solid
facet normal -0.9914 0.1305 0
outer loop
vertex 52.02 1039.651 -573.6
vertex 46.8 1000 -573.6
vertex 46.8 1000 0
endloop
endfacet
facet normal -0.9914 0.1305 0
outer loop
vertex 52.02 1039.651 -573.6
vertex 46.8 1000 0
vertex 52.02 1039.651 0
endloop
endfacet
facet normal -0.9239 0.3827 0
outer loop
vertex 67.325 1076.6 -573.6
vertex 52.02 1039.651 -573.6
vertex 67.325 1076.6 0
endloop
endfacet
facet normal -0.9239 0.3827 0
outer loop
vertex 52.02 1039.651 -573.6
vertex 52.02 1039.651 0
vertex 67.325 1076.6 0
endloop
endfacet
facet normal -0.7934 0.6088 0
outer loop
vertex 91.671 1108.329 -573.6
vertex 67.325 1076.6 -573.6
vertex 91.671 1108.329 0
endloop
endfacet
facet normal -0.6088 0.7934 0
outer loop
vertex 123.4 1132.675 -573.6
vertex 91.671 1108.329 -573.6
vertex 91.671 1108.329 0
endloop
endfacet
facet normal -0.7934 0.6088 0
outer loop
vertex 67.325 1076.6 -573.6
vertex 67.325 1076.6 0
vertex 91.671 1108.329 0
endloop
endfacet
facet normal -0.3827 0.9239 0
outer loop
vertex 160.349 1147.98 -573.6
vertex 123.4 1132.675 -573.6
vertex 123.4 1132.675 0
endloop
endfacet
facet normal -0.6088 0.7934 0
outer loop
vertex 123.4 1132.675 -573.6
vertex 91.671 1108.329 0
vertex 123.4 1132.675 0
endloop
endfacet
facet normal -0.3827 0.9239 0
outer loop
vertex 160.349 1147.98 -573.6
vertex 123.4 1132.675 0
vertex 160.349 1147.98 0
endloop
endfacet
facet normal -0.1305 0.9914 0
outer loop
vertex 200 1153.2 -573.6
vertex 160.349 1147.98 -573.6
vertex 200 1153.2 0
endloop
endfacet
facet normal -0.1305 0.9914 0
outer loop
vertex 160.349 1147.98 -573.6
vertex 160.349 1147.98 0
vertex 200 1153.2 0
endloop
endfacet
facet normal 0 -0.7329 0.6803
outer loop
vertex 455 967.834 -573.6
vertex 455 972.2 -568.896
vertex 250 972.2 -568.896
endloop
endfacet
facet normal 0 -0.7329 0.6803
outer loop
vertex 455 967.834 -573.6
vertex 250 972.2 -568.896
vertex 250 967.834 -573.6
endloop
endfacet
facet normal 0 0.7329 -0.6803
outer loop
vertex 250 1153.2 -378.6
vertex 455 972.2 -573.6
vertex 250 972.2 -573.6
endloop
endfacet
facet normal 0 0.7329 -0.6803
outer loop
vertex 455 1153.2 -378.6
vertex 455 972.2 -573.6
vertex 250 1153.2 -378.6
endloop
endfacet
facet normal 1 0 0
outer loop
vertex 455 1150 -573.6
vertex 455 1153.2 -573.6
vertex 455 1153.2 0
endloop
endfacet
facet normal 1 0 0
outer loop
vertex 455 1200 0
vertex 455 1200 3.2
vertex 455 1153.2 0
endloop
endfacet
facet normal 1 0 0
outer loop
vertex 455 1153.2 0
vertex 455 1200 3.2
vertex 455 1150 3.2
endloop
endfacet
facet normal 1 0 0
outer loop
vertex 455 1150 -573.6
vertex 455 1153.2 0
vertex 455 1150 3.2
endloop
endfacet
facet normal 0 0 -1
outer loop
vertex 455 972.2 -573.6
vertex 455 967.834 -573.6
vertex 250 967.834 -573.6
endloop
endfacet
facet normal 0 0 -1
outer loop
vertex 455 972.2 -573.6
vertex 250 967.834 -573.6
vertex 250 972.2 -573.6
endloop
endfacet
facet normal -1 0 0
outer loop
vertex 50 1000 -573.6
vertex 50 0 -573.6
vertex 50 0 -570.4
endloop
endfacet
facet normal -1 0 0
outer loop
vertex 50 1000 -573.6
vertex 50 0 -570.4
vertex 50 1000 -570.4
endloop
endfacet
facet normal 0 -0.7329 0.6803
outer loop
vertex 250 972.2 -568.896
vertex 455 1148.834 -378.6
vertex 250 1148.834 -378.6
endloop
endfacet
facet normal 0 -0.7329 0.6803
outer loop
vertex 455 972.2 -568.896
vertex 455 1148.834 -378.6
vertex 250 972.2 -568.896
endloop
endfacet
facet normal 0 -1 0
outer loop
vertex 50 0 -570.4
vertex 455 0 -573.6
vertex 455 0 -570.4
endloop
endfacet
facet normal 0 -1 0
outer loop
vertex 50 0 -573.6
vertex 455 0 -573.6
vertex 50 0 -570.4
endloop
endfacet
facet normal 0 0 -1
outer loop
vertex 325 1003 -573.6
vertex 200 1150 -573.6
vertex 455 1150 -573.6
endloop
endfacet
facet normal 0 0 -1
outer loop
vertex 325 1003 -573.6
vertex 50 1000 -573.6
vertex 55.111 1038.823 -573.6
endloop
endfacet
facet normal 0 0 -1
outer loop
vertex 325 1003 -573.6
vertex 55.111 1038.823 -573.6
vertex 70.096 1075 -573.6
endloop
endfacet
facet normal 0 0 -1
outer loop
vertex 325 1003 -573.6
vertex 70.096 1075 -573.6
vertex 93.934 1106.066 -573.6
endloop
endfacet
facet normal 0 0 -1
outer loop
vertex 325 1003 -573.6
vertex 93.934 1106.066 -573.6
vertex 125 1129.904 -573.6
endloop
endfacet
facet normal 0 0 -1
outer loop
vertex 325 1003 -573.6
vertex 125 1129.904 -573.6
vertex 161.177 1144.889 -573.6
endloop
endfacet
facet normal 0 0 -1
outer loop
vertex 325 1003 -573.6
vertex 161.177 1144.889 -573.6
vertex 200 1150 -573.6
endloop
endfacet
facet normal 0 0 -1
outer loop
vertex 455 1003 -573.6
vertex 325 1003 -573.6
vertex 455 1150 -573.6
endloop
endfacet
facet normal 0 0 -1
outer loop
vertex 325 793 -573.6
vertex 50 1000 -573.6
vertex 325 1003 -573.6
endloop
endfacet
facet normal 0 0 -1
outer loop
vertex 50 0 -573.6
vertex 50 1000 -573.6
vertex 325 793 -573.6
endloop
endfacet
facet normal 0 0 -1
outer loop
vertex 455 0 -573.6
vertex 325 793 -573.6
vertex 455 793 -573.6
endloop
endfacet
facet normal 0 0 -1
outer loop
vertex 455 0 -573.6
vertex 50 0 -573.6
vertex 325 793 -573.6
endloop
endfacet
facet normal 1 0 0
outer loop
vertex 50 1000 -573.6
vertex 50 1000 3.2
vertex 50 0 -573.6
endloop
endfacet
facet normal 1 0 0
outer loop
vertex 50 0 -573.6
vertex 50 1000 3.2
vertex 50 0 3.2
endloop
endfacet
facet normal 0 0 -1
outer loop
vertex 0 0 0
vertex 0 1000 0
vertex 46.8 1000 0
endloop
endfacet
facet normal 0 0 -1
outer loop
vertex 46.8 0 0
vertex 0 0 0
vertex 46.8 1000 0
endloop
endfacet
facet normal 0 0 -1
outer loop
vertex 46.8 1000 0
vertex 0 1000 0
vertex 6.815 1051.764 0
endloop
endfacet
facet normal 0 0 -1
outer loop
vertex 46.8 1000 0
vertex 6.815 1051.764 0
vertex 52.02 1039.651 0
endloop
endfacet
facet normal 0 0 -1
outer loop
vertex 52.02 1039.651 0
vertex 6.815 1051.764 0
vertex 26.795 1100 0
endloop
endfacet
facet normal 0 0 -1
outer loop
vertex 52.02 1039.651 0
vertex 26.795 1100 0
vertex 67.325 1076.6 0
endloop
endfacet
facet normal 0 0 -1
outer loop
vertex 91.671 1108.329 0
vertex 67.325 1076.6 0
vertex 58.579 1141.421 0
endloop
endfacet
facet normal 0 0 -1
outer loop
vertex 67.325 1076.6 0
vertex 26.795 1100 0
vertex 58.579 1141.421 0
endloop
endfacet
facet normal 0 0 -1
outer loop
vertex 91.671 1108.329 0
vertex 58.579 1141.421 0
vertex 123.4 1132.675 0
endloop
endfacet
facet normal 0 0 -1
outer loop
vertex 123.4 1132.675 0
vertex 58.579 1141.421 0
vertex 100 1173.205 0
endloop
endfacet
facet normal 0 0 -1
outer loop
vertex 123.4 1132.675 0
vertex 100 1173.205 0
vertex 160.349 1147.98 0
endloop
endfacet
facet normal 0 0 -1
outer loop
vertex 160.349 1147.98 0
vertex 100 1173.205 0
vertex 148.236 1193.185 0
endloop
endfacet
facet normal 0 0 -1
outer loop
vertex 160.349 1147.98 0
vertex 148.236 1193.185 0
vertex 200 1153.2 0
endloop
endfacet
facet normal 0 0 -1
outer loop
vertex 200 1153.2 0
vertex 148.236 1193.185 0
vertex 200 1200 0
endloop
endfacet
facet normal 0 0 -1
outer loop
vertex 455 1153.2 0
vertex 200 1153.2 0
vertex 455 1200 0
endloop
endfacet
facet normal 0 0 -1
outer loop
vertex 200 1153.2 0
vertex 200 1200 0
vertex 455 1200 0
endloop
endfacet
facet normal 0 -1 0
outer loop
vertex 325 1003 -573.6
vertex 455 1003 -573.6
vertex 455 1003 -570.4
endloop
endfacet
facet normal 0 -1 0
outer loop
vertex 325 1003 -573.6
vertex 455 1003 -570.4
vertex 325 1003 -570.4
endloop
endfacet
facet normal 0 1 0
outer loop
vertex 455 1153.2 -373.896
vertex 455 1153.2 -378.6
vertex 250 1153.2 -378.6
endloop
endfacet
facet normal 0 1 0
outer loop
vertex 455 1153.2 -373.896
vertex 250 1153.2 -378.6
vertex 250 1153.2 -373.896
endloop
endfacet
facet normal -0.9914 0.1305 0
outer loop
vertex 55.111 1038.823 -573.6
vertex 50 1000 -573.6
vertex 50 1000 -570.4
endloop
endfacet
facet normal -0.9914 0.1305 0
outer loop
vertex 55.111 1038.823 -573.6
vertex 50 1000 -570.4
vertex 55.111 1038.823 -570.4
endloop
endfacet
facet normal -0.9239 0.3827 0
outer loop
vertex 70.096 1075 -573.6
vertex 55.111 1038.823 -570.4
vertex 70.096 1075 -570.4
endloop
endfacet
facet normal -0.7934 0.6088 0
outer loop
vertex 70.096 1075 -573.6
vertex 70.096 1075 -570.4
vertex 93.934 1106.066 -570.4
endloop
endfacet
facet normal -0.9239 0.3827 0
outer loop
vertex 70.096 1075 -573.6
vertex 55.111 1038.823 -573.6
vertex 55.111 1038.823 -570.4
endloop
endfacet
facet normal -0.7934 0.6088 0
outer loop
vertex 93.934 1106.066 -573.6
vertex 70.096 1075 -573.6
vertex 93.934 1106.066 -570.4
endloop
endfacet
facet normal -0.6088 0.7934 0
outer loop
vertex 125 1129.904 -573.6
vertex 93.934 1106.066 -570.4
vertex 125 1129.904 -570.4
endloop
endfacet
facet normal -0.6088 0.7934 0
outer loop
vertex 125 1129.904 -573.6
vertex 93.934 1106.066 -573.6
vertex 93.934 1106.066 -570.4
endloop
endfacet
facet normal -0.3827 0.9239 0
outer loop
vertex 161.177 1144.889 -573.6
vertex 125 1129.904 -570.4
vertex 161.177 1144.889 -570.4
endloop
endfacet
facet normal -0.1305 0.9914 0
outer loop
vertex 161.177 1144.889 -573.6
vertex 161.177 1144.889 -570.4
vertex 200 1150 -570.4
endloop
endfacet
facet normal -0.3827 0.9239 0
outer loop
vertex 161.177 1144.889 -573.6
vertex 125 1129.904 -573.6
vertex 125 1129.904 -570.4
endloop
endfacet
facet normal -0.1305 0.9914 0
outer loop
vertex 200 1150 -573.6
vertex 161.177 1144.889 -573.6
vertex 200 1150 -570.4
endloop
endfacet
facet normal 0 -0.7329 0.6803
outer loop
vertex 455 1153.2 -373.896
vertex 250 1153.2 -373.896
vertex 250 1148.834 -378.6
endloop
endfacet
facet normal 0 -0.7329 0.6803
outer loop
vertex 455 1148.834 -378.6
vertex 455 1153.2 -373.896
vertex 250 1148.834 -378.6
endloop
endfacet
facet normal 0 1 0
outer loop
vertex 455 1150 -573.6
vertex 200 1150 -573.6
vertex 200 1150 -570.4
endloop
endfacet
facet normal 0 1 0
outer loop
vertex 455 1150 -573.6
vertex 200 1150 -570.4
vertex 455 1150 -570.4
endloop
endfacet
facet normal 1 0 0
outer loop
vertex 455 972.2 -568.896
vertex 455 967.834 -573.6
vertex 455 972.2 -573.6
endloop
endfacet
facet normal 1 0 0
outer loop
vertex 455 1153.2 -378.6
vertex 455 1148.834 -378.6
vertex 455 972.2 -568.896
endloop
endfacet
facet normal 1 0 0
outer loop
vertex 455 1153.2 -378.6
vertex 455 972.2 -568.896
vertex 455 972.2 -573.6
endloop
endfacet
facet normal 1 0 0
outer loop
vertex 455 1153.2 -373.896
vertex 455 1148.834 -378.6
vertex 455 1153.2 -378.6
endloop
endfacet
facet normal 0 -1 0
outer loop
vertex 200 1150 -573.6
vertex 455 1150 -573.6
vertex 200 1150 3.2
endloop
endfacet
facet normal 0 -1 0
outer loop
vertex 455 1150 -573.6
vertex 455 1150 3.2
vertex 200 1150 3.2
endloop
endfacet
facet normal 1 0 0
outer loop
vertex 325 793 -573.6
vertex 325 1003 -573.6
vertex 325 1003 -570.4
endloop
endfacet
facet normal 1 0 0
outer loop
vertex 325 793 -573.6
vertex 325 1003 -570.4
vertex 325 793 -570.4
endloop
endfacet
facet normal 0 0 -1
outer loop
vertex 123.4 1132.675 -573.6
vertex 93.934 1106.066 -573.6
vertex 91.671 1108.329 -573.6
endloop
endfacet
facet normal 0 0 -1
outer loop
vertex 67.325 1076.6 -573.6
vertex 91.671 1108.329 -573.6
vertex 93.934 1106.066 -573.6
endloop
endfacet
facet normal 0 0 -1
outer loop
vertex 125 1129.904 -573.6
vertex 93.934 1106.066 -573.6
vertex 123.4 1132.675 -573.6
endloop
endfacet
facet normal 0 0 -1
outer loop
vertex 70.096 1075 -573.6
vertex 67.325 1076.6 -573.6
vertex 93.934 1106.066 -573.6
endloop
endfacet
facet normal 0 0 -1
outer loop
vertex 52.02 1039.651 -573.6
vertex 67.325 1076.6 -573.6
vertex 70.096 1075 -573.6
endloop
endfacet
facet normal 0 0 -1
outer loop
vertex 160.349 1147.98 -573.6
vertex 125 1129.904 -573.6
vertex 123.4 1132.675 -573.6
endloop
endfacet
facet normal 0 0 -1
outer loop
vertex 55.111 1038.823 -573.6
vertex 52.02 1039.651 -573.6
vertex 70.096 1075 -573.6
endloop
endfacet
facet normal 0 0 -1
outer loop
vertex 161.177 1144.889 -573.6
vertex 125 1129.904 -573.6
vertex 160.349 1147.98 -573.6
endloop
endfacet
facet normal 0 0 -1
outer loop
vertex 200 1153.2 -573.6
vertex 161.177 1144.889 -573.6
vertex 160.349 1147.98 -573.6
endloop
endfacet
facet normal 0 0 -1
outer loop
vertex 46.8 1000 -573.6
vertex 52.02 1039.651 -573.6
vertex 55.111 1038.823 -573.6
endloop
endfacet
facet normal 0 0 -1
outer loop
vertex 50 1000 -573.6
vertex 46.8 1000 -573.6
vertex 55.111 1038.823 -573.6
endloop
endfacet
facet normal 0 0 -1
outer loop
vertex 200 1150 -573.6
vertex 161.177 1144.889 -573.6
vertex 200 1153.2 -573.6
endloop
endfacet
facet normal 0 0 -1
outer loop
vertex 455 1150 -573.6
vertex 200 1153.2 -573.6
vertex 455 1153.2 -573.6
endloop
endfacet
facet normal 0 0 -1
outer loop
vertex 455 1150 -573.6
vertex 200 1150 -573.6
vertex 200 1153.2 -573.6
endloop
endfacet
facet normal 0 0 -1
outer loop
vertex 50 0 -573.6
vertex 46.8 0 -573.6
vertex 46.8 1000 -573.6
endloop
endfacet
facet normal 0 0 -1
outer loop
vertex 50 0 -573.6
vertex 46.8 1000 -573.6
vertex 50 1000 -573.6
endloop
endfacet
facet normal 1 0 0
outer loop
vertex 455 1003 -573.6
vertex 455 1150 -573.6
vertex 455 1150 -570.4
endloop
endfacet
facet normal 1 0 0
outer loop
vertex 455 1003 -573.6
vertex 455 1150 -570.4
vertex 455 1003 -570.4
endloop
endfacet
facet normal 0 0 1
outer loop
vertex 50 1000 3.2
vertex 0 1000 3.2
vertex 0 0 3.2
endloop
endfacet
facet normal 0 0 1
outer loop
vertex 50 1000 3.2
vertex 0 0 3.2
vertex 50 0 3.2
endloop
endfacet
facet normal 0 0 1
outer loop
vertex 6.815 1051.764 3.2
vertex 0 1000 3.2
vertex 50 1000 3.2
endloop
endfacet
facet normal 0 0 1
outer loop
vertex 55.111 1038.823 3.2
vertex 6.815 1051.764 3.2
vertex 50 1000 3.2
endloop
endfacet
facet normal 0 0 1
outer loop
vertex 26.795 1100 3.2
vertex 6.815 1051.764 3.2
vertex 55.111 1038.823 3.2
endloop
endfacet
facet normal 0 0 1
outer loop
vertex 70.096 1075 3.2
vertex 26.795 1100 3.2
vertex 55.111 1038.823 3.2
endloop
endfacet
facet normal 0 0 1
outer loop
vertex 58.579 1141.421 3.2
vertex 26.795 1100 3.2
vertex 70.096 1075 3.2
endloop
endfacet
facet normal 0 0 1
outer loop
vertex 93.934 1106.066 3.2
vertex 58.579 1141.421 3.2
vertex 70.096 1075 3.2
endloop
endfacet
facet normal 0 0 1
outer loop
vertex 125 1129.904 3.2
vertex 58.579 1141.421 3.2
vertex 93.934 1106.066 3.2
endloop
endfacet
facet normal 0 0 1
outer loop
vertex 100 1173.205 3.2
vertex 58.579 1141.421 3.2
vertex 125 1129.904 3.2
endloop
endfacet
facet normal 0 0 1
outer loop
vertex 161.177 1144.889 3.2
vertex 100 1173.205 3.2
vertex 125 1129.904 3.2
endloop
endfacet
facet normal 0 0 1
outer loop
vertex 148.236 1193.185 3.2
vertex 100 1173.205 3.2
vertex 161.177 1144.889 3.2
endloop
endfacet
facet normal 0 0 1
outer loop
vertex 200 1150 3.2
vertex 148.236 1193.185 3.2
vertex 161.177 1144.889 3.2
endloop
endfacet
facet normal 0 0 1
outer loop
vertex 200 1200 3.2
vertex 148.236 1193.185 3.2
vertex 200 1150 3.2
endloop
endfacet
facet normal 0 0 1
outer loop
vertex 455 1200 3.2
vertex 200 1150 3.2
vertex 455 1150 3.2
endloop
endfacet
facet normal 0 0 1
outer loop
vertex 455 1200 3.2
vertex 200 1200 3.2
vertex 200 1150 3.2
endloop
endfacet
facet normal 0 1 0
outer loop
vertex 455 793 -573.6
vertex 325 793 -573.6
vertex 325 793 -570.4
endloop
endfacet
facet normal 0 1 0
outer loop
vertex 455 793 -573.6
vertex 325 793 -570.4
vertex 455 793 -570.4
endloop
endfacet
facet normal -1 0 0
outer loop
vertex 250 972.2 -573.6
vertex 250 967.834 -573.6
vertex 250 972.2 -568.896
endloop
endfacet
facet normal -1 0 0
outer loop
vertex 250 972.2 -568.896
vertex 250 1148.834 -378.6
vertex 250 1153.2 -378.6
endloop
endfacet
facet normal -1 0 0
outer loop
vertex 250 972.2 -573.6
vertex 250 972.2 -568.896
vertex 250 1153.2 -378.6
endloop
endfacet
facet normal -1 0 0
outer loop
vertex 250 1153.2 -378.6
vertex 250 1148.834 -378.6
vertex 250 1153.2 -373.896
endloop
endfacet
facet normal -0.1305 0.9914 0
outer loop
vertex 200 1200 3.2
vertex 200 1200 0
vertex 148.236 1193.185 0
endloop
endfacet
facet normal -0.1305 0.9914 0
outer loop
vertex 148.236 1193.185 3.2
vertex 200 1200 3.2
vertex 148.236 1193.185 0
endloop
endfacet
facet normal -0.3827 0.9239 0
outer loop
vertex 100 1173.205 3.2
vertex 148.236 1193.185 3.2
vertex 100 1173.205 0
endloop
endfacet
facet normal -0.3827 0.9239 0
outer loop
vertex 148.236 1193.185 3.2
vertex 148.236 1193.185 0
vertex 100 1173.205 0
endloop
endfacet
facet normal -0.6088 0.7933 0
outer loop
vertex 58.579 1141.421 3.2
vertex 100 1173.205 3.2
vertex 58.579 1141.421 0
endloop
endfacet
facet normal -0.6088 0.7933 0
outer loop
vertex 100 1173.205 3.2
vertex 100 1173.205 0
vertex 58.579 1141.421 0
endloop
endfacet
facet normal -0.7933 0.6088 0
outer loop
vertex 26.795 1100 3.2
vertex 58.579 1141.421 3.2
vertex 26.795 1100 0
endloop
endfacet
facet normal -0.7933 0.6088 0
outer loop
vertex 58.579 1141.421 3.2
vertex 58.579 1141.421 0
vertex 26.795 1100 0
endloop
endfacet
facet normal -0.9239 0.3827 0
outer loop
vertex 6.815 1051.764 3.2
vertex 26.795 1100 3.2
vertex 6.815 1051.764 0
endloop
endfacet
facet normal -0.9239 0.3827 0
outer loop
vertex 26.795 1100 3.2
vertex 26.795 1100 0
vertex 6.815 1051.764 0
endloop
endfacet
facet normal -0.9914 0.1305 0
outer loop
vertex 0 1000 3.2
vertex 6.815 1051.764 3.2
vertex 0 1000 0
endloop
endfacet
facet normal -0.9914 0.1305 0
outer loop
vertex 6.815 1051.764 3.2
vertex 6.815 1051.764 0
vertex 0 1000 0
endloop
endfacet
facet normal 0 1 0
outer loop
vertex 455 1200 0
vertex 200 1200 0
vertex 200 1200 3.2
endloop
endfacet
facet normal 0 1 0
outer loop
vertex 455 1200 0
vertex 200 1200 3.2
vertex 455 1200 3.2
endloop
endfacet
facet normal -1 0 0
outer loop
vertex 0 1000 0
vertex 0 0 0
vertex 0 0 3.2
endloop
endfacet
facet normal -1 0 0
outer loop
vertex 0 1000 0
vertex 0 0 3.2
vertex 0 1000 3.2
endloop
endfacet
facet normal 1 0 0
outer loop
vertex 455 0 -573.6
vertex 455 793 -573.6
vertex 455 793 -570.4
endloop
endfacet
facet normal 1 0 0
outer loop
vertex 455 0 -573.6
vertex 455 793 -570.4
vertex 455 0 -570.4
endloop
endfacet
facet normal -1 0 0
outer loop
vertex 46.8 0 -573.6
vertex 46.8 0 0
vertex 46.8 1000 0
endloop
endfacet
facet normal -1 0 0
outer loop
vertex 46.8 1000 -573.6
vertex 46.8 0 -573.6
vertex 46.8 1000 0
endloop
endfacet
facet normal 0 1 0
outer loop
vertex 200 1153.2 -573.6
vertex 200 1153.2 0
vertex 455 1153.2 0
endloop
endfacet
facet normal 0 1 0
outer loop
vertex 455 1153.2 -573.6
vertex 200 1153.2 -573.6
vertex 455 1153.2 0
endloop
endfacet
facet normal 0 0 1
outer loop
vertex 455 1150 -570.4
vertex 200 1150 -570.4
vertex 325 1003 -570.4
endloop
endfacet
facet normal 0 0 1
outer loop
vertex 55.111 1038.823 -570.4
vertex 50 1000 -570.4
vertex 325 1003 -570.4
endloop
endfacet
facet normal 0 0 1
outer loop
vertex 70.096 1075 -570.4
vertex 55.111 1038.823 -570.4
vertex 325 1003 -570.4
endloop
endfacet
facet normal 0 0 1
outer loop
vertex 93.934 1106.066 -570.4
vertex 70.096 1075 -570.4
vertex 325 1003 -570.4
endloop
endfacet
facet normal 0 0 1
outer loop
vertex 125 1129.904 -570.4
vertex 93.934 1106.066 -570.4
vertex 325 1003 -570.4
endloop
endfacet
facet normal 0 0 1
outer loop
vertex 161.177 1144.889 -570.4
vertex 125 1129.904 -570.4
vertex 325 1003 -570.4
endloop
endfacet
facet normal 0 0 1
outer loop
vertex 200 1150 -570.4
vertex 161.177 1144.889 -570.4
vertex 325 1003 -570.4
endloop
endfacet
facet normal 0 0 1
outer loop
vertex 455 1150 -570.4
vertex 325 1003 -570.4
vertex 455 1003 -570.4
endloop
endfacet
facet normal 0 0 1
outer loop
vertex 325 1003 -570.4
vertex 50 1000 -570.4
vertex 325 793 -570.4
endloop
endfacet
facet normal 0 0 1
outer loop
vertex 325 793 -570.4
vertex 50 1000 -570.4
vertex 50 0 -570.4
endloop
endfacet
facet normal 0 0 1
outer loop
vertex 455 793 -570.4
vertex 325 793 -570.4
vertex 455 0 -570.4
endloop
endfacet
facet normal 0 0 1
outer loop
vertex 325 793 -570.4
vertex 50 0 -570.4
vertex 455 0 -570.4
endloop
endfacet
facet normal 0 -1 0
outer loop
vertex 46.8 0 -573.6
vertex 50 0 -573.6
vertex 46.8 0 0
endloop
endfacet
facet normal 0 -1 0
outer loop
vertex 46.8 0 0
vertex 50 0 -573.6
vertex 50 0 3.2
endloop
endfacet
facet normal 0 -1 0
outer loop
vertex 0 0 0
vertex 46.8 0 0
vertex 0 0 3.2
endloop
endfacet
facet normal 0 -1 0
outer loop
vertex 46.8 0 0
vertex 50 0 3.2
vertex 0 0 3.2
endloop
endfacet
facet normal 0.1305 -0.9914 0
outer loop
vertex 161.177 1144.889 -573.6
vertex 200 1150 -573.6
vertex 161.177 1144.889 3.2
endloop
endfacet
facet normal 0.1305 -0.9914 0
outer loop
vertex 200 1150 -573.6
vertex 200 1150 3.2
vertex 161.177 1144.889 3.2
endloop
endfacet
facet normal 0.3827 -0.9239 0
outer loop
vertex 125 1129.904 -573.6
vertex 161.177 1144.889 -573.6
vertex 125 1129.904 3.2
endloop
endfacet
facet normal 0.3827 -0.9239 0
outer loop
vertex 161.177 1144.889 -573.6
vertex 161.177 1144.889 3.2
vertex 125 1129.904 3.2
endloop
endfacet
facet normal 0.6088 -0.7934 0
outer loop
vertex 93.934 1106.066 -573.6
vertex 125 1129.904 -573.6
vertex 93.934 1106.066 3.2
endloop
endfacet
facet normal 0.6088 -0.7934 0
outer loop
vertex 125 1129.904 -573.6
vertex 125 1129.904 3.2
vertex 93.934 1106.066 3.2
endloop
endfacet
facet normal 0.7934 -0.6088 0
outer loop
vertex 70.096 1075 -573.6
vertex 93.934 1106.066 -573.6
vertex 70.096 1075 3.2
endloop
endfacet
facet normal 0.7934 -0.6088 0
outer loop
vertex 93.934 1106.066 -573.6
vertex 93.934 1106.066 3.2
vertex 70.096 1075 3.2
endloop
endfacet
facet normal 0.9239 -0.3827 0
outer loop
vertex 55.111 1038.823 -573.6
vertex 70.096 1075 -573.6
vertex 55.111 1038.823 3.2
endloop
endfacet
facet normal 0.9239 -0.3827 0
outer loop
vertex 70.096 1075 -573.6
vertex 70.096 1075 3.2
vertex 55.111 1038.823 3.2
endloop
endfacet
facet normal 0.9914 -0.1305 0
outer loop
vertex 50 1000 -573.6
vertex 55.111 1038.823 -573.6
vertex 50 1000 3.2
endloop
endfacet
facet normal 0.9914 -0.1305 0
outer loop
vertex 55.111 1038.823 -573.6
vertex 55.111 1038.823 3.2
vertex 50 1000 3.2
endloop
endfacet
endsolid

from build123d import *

# Parameters (mm, degrees)
F0_W     = 50
F0_H     = 1000
F0_W_2   = 255
F0_H_2   = 50
F1_DEPTH = 3.2
F3_DEPTH = 573.6
F5_DEPTH = 3.2
F7_DEPTH = 205


with BuildPart() as f1:
    # F0 (on Top) → F1 (new body)
    with BuildSketch(Plane.XY):
        with Locations((25, 500)):
            Rectangle(F0_W, F0_H)
        with BuildLine():
            ThreePointArc((200, 1200), (58.578644, 1141.421356), (0, 1000))
            Line((0, 1000), (50, 1000))
            ThreePointArc((50, 1000), (93.933983, 1106.066017), (200, 1150))
            Line((200, 1150), (200, 1200))
        make_face()
        with Locations((327.5, 1175)):
            Rectangle(F0_W_2, F0_H_2)
    extrude(amount=F1_DEPTH)

    # F2 (on face) → F3 (join)
    with BuildSketch(Plane(origin=(0, 0, 0), x_dir=(1, 0, 0), z_dir=(0, 0, -1))):
        with BuildLine():
            ThreePointArc((46.8, -1000), (91.671241, -1108.328759), (200, -1153.2))
            Line((200, -1153.2), (455, -1153.2))
            Line((455, -1153.2), (455, -1150))
            Line((455, -1150), (200, -1150))
            ThreePointArc((200, -1150), (93.933983, -1106.066017), (50, -1000))
            Line((50, -1000), (50, 0))
            Line((50, 0), (46.8, 0))
            Line((46.8, 0), (46.8, -1000))
        make_face()
    extrude(amount=F3_DEPTH)


with BuildPart() as f5:
    # F4 (on face) → F5 (new body)
    with BuildSketch(Plane(origin=(0, 0, -573.6), x_dir=(1, 0, 0), z_dir=(0, 0, -1))):
        with BuildLine():
            Line((200, -1150), (455, -1150))
            Line((455, -1150), (455, -1003))
            Line((455, -1003), (325, -1003))
            Line((325, -1003), (325, -793))
            Line((325, -793), (455, -793))
            Line((455, -793), (455, 0))
            Line((455, 0), (50, 0))
            Line((50, 0), (50, -1000))
            ThreePointArc((50, -1000), (93.933983, -1106.066017), (200, -1150))
        make_face()
    extrude(amount=-F5_DEPTH)


with BuildPart() as f7:
    # F6 (on face) → F7 (new body)
    with BuildSketch(Plane.YZ.offset(455)):
        Polygon((1153.2, -378.6), (1150, -378.6), (1148.833947, -378.6), (972.2, -568.896241), (972.2, -573.6), align=None)
        Polygon((1148.833947, -378.6), (1150, -378.6), (1153.2, -378.6), (1153.2, -373.896241), align=None)
        Polygon((972.2, -573.6), (972.2, -568.896241), (967.833947, -573.6), align=None)
    extrude(amount=-F7_DEPTH)


solid = Compound([f1.part, f5.part, f7.part])
